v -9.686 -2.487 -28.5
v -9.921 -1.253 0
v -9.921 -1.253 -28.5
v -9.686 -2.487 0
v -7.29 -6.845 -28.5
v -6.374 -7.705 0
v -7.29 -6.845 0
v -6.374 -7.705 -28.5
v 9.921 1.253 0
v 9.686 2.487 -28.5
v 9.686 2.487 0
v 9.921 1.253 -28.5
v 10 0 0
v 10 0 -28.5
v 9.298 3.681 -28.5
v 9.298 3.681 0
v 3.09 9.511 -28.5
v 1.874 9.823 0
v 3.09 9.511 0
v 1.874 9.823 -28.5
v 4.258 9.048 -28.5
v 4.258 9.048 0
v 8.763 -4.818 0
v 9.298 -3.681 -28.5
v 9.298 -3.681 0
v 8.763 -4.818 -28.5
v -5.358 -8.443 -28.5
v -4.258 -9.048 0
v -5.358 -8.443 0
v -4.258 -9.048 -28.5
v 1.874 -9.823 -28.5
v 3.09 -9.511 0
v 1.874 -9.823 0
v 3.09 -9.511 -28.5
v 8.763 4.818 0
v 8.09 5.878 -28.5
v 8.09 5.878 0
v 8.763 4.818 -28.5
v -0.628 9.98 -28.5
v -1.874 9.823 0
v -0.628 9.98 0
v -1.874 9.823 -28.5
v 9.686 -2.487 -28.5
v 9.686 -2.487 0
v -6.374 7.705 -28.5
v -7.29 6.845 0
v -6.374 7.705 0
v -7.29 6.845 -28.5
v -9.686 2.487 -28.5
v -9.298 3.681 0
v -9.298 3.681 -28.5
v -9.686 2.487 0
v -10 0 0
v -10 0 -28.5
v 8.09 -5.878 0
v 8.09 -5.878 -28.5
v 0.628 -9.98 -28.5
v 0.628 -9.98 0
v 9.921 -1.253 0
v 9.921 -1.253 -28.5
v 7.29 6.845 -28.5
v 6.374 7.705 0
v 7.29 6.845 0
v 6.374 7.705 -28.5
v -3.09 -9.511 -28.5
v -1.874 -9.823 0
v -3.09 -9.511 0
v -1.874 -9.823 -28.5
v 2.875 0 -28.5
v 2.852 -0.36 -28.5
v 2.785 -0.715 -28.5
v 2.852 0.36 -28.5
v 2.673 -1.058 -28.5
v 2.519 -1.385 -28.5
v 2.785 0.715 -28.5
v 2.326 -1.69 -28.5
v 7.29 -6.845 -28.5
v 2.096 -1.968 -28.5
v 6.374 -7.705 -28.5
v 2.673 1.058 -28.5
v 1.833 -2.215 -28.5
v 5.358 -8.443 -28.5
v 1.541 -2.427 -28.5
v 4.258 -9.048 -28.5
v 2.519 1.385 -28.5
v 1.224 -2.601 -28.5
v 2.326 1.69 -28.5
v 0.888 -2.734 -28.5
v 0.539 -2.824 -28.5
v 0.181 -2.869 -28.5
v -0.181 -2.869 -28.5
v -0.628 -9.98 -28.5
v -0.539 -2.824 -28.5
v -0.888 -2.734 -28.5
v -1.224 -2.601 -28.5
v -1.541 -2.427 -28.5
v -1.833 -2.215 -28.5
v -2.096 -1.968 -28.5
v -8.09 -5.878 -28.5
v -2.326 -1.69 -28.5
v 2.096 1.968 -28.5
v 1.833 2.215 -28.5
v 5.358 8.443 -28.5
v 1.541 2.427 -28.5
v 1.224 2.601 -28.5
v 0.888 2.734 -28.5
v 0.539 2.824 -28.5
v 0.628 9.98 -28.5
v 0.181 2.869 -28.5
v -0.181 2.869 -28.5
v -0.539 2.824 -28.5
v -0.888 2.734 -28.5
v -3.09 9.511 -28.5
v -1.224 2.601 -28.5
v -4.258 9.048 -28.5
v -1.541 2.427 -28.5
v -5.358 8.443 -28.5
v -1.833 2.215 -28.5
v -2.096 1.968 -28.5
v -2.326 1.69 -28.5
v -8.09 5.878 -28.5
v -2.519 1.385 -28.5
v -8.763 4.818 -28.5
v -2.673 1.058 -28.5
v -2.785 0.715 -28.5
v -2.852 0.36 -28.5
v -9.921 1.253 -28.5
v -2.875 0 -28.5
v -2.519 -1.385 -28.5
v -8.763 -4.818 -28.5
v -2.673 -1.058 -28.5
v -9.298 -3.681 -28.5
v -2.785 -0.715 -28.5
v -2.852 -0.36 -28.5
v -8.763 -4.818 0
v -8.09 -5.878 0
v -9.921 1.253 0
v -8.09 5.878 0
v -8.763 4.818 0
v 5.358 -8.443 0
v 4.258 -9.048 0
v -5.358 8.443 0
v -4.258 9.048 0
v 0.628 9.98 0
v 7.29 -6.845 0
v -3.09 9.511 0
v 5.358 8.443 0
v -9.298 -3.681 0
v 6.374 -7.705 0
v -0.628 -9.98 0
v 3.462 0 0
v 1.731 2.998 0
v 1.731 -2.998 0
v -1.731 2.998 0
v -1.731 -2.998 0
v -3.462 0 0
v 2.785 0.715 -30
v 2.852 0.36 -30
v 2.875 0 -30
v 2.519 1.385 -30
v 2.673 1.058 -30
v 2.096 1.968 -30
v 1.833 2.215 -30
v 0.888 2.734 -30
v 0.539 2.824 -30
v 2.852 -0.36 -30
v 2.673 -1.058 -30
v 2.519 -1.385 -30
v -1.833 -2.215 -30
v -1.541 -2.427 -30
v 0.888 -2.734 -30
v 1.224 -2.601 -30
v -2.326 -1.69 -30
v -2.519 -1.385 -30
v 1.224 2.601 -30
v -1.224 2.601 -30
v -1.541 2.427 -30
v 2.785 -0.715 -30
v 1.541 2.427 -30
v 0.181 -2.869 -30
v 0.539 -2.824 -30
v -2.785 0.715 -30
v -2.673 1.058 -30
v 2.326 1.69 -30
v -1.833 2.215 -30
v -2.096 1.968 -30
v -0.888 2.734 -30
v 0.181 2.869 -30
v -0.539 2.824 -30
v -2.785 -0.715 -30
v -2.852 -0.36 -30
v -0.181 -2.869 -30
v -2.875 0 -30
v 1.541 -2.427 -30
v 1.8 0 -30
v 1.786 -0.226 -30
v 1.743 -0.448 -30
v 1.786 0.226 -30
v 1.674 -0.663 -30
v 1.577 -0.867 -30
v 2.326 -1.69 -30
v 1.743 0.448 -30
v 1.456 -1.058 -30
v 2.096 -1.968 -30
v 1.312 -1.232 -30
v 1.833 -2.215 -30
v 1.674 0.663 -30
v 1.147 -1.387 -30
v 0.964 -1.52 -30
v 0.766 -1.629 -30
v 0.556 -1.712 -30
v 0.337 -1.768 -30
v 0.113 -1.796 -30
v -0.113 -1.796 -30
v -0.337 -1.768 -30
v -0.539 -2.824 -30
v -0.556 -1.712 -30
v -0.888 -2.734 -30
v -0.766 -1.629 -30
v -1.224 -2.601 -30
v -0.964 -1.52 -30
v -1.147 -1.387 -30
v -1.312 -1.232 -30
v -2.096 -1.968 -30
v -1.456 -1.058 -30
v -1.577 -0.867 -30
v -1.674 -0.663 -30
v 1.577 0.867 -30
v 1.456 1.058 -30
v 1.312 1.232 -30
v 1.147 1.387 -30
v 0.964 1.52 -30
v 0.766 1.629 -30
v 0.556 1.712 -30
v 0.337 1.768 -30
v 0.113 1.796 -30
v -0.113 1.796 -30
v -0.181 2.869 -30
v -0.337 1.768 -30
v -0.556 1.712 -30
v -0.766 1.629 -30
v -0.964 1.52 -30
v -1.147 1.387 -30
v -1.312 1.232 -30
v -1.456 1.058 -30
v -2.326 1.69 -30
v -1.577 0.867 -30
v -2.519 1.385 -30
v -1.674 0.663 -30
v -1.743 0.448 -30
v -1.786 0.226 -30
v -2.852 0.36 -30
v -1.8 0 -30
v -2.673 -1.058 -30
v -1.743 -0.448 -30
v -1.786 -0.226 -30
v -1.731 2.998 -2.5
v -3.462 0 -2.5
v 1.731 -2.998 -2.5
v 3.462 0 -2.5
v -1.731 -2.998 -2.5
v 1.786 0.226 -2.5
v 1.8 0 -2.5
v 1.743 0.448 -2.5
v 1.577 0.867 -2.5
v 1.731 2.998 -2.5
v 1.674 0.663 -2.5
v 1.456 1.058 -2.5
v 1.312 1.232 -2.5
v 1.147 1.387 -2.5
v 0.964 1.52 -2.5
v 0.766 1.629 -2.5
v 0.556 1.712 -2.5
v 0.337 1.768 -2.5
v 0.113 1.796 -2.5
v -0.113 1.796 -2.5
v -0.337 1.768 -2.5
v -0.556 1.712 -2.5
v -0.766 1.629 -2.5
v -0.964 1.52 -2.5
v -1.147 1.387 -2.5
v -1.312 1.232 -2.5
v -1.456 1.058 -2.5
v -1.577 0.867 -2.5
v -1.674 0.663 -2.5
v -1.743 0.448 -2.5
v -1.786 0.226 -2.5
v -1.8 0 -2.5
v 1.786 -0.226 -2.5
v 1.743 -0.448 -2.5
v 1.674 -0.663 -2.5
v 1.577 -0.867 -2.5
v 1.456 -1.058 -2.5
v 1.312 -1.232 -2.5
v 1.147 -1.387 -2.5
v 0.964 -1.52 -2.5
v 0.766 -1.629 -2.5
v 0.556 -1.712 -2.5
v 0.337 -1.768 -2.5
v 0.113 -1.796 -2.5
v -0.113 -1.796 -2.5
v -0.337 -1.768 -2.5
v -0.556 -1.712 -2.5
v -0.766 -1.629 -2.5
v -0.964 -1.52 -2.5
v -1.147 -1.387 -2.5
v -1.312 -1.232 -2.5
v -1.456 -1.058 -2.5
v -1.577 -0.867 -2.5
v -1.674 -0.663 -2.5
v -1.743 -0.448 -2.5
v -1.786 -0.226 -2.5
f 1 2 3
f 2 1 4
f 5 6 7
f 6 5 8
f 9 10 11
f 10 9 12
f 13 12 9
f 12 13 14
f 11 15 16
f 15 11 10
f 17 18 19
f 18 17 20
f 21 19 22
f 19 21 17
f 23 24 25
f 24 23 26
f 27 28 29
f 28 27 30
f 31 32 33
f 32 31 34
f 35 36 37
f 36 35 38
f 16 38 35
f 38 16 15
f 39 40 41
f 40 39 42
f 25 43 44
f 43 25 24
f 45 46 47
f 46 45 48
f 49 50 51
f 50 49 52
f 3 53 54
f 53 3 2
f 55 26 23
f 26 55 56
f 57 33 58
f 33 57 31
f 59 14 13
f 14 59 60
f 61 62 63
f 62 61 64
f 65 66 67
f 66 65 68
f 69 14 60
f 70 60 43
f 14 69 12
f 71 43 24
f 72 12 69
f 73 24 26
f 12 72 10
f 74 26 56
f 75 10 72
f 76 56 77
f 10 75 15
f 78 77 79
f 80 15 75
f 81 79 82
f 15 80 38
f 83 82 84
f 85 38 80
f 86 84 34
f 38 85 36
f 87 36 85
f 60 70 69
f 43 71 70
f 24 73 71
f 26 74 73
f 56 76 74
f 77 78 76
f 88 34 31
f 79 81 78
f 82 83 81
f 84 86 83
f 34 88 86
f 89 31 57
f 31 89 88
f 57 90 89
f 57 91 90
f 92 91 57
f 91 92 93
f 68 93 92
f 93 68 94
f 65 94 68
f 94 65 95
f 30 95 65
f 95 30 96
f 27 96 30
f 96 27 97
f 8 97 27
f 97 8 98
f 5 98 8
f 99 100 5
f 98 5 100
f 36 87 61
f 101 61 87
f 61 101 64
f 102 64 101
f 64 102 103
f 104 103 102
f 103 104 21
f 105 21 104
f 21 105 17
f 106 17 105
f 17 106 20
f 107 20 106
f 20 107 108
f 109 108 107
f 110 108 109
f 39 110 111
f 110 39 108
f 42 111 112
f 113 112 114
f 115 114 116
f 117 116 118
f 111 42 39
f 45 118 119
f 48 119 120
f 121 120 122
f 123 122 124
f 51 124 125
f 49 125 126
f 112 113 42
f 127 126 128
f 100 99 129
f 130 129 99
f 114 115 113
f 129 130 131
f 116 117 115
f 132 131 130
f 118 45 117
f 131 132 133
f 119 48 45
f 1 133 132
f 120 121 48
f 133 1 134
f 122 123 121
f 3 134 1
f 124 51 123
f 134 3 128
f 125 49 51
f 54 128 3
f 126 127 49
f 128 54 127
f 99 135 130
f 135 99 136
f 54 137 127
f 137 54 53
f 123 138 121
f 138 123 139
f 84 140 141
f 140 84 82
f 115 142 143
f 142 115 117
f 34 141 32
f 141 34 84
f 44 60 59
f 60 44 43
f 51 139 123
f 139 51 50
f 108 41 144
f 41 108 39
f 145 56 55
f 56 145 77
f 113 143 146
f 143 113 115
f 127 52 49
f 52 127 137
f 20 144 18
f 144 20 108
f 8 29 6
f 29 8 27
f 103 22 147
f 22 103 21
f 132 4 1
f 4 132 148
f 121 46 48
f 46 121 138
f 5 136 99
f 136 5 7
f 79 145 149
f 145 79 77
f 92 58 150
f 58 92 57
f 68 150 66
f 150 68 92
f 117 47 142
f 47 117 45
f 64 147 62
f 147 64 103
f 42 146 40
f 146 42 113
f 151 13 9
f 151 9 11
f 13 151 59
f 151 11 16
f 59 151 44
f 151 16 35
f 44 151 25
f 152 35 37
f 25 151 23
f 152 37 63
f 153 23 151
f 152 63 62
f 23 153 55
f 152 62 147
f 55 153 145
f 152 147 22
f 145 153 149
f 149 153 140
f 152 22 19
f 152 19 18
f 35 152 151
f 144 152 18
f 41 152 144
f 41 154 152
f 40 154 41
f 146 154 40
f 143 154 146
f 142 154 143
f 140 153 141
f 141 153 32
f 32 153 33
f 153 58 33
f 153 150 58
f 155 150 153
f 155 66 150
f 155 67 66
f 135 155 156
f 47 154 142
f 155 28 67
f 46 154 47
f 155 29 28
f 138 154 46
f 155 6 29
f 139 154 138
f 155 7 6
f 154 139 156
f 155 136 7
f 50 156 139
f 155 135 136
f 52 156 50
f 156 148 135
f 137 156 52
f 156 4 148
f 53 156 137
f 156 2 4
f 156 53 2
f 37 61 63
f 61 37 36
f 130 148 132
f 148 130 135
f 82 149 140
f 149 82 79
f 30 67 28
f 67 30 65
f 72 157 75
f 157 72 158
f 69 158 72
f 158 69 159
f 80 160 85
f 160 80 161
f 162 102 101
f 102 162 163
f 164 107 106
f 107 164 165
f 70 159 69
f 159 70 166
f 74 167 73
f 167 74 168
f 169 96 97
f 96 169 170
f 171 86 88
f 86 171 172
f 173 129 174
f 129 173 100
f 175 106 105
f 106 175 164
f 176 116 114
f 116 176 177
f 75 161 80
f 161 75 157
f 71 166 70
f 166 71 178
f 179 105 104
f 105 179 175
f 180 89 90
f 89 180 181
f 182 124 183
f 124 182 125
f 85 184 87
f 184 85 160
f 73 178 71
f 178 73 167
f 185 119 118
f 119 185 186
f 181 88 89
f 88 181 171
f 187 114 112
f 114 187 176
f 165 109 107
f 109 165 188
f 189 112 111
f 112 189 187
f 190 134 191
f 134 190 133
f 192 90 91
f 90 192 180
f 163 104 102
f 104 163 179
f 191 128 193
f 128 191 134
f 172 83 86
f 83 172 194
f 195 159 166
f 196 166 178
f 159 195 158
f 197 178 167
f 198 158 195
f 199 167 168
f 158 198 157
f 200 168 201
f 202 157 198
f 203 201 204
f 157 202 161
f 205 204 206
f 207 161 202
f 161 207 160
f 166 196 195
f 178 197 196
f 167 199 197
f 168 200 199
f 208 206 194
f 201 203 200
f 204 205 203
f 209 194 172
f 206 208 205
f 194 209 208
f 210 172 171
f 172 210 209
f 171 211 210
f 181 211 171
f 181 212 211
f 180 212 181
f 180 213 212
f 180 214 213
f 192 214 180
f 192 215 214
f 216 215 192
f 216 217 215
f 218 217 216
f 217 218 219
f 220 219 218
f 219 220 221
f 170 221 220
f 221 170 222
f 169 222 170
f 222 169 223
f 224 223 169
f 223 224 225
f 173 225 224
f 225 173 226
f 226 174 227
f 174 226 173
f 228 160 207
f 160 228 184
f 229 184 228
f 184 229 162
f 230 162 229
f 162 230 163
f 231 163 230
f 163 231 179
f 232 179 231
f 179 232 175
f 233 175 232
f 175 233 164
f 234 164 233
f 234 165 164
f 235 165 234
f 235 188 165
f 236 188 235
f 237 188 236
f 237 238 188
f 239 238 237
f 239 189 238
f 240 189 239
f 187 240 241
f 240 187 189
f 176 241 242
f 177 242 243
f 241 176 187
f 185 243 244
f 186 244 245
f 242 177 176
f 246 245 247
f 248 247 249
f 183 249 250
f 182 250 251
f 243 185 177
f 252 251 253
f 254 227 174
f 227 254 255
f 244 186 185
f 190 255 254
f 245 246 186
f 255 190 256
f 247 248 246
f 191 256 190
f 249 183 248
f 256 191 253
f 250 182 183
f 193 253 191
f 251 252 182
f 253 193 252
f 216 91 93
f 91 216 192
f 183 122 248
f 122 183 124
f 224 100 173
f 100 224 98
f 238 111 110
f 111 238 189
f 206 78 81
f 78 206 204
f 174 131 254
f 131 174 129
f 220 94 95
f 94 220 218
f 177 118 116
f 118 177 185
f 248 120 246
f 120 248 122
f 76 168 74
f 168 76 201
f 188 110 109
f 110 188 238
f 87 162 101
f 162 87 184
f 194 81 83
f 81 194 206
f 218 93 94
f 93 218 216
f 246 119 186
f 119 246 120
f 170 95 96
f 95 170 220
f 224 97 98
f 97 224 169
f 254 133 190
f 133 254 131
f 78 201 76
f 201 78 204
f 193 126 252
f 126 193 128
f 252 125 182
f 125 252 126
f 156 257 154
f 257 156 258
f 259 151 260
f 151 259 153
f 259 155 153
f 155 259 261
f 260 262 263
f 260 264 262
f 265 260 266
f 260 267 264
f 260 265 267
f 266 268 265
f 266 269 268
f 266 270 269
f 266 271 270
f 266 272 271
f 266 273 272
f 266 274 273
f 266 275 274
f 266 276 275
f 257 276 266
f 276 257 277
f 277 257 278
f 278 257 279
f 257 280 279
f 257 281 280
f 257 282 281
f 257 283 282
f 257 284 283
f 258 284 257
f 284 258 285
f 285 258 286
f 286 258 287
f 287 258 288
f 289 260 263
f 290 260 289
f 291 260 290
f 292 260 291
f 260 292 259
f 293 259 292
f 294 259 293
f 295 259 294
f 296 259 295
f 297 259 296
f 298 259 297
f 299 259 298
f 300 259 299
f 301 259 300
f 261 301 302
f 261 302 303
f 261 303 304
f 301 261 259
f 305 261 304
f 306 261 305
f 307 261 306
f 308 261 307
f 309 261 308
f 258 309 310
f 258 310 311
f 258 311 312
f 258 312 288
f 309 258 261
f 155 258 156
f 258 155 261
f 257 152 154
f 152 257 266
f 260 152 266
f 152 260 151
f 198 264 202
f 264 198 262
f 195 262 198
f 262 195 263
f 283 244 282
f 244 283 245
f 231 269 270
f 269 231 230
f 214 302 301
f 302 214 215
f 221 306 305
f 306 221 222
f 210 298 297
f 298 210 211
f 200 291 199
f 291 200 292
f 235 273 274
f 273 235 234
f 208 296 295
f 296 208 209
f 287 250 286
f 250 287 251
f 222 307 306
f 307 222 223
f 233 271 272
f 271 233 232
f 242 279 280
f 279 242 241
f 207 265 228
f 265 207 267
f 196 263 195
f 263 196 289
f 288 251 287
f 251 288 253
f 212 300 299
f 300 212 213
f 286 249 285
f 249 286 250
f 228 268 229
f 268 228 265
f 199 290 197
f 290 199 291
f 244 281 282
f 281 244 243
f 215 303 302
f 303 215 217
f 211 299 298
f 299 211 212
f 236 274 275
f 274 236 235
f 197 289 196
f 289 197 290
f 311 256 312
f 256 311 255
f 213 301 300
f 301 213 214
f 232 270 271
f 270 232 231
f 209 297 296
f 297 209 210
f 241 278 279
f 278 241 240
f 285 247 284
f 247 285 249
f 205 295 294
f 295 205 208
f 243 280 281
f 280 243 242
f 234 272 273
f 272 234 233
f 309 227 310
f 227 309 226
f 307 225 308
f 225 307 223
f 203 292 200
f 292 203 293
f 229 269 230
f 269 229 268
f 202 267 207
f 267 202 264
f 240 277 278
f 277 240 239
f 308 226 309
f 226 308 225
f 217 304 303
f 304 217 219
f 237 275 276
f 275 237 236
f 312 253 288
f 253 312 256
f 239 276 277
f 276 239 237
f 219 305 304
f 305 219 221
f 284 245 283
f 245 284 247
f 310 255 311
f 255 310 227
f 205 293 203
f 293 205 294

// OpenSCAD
$fn = 50;


difference() {
	union() {
		translate(v = [0, 0, -28.5000000000]) {
			cylinder(h = 28.5000000000, r = 10.0000000000);
		}
		#translate(v = [0, 0, -30.0000000000]) {
			cylinder(h = 30, r = 2.8750000000);
		}
	}
	union() {
		translate(v = [0, 0, 0]) {
			rotate(a = [0, 0, 0]) {
				difference() {
					union() {
						translate(v = [0, 0, -2.5000000000]) {
							linear_extrude(height = 2.5000000000) {
								polygon(points = [[3.4620000000, 0.0000000000], [1.7310000000, 2.9981799479], [-1.7310000000, 2.9981799479], [-3.4620000000, 0.0000000000], [-1.7310000000, -2.9981799479], [1.7310000000, -2.9981799479]]);
							}
						}
					}
					union();
				}
			}
		}
		#translate(v = [0, 0, -100.0000000000]) {
			cylinder(h = 200, r = 1.8000000000);
		}
	}
}
